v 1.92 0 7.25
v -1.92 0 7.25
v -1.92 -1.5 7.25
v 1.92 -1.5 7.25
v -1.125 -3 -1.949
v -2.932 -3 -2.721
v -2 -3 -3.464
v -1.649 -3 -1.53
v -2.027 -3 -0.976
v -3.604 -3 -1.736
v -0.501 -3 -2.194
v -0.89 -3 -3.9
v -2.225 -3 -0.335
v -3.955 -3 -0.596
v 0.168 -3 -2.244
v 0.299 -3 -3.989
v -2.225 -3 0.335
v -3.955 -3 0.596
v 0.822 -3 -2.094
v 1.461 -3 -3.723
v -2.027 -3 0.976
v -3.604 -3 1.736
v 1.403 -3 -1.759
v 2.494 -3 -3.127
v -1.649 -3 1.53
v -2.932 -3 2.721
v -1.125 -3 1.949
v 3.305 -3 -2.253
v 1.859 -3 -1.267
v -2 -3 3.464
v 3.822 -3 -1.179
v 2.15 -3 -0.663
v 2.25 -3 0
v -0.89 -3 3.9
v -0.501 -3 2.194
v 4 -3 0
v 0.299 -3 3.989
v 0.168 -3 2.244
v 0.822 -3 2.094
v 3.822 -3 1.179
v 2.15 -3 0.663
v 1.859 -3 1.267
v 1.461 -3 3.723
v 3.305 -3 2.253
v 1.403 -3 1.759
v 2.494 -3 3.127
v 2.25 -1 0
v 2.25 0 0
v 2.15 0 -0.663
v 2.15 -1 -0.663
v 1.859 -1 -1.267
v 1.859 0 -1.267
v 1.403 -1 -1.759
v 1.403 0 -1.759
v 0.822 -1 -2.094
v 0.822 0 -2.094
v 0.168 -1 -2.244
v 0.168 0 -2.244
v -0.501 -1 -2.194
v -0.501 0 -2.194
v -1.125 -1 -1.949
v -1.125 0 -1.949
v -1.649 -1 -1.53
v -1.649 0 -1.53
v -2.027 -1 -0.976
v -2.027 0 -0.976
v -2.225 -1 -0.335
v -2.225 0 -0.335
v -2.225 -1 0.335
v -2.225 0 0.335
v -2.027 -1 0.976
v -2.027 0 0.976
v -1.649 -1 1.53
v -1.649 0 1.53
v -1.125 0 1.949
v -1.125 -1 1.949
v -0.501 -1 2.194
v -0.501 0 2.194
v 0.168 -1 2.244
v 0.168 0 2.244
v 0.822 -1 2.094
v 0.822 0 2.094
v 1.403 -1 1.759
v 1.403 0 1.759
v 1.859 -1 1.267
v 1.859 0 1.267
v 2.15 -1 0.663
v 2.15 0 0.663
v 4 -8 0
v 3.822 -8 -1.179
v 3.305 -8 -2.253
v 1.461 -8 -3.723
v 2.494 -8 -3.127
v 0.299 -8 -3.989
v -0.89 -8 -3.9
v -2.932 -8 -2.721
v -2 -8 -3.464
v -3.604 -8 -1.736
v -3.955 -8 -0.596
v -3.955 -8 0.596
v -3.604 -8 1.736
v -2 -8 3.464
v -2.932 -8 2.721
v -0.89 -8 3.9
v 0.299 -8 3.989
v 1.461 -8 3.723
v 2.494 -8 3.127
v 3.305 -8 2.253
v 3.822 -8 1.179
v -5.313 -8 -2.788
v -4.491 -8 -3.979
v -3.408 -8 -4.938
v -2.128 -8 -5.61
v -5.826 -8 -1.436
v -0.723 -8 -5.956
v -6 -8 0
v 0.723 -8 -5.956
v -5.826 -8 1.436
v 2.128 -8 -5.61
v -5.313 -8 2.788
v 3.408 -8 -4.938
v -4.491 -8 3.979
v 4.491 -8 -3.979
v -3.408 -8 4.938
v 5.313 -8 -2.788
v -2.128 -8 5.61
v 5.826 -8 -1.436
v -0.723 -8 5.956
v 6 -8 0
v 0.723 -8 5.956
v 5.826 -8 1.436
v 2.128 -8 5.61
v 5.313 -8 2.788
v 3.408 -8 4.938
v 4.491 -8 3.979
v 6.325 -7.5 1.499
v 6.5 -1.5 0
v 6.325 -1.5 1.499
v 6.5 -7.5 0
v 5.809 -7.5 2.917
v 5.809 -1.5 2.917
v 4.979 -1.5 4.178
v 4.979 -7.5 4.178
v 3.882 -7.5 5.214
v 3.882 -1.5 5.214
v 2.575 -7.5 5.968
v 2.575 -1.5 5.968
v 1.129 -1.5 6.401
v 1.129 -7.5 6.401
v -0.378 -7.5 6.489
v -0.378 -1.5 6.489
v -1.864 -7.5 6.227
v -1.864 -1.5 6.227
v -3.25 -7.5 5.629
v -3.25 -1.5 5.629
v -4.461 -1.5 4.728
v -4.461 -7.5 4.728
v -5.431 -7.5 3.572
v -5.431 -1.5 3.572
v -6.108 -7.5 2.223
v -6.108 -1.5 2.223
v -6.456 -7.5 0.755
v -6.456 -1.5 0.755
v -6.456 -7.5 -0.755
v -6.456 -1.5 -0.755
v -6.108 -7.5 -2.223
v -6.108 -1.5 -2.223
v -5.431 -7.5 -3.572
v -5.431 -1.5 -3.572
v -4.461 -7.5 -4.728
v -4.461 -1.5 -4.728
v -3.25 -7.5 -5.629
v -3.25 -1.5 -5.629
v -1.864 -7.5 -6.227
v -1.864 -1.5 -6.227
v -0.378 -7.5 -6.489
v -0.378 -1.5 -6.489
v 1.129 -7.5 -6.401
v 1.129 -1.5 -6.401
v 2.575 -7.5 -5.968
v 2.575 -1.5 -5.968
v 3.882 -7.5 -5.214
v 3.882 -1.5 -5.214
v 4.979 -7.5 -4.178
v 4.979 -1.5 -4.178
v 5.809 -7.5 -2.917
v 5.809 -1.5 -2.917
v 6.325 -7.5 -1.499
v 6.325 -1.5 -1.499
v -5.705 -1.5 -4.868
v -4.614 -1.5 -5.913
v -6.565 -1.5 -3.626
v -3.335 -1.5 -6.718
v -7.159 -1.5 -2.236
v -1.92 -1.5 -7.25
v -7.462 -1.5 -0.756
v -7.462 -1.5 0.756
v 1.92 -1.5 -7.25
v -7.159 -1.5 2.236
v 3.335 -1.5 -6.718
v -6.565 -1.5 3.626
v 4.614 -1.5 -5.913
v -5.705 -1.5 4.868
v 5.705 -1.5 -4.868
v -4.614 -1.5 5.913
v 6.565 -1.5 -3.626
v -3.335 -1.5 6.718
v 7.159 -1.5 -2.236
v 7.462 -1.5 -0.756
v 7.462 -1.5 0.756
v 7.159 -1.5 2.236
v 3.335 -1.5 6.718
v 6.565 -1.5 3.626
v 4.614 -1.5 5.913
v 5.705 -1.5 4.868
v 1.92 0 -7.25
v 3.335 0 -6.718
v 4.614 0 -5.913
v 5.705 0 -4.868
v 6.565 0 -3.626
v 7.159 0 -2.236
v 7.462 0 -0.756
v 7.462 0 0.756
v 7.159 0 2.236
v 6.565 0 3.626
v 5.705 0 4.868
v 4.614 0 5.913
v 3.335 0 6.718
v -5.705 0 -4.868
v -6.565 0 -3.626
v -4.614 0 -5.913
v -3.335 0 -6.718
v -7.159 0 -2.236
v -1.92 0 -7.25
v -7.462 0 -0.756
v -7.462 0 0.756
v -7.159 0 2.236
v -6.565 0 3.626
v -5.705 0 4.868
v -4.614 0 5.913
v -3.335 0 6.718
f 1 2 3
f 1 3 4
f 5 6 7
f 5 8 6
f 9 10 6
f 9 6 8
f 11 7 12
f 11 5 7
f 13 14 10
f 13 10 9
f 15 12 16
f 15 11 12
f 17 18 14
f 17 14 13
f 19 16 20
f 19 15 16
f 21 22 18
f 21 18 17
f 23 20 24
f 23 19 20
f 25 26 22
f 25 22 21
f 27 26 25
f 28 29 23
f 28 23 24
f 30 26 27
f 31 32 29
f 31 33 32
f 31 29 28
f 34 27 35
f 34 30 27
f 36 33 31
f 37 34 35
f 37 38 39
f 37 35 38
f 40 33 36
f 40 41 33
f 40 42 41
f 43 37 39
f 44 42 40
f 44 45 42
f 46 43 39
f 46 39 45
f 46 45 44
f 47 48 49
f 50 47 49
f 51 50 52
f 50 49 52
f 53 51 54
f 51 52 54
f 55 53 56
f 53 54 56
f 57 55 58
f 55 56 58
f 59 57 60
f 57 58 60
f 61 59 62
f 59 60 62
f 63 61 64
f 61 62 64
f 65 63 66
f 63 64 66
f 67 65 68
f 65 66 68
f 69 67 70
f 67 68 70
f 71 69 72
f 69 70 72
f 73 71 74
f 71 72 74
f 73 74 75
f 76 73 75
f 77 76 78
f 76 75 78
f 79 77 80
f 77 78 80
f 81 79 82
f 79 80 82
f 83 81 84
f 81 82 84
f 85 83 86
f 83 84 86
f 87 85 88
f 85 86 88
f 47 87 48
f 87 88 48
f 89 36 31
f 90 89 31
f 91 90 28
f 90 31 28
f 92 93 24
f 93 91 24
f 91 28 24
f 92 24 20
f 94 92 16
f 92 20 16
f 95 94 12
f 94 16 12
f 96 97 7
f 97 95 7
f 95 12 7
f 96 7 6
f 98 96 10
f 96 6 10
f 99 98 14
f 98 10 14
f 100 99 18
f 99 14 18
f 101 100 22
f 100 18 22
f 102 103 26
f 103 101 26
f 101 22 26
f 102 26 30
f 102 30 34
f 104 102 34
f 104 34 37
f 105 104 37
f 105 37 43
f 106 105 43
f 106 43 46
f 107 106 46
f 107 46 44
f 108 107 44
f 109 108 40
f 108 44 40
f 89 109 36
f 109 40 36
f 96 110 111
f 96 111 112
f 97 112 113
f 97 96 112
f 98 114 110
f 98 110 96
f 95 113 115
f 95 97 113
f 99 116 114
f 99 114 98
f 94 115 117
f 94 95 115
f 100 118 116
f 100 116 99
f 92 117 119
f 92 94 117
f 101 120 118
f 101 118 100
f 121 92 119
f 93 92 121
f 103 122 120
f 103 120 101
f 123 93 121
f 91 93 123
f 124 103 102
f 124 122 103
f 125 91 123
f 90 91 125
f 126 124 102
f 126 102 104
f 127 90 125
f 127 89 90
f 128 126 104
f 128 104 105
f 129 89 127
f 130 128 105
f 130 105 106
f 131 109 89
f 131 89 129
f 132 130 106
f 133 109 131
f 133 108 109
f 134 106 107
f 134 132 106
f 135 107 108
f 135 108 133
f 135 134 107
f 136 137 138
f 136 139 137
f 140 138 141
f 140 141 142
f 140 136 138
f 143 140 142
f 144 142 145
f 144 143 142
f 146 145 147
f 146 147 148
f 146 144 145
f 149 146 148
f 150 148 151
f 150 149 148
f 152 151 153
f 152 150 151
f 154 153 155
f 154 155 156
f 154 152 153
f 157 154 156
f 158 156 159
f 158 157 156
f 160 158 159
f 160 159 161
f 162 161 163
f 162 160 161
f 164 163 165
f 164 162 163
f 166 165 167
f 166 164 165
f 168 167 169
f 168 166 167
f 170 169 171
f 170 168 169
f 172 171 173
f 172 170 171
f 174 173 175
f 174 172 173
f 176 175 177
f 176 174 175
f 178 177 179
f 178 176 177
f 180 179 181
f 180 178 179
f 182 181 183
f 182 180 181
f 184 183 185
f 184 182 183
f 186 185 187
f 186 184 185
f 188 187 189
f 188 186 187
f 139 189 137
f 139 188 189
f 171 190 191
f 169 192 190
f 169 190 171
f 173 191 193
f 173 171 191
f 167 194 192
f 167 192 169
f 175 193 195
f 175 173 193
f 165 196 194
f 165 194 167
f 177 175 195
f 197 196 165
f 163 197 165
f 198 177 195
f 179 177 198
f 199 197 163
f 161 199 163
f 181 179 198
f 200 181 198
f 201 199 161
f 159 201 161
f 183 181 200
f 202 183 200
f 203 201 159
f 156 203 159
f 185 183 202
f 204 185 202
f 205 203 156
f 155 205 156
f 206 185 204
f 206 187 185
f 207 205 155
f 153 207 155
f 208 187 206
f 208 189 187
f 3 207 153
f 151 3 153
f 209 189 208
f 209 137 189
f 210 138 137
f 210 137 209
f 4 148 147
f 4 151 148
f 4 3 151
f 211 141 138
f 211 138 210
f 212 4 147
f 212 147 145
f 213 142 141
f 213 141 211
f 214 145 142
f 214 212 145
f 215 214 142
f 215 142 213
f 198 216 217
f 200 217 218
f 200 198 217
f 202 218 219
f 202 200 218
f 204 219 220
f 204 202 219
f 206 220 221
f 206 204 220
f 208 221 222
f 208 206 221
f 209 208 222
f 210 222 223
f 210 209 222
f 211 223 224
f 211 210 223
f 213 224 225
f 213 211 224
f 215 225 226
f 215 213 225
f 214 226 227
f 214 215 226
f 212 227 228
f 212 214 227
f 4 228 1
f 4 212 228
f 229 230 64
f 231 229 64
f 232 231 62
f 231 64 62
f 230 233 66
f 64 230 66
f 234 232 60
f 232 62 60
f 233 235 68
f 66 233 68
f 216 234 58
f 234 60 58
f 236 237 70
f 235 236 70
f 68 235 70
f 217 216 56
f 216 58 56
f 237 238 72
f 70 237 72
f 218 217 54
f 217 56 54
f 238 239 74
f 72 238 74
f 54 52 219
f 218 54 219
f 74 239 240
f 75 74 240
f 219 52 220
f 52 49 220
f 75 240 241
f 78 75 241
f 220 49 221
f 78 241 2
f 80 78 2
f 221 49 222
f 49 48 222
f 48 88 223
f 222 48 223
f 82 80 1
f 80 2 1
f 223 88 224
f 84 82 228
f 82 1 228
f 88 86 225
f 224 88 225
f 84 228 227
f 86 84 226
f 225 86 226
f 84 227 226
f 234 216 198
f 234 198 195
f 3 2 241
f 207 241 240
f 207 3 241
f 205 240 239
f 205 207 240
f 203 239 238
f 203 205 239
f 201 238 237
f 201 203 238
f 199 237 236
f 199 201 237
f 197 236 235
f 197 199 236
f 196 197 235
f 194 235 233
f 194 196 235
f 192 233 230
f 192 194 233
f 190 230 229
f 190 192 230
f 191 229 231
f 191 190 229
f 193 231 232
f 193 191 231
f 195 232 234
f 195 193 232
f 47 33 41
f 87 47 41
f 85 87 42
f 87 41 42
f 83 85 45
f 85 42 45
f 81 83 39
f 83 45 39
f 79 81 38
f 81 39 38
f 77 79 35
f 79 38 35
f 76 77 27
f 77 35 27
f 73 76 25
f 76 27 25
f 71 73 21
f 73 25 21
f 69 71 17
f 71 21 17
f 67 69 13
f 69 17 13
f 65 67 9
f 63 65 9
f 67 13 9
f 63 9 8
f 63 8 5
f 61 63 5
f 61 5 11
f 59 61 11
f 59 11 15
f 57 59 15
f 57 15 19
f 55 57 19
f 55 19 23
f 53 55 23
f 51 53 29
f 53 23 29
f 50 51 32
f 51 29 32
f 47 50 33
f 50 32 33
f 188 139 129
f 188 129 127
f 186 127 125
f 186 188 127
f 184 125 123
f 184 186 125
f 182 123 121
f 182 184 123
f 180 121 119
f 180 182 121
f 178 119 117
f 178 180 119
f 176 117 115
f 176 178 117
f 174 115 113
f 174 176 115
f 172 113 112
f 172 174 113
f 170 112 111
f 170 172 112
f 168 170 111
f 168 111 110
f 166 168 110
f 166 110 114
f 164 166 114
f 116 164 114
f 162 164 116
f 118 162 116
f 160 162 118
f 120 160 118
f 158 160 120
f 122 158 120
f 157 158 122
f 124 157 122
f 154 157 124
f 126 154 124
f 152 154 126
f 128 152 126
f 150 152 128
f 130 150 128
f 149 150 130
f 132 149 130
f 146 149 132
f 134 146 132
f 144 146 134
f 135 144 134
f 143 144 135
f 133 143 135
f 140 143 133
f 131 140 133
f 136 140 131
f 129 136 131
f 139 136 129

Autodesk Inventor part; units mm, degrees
ref_plane "YZ Plane" through (0, 0, 0) normal (1, 0, 0) x (0, 1, 0)
ref_plane "XZ Plane" through (0, 0, 0) normal (0, 1, 0) x (-1, 0, 0)
ref_plane "XY Plane" through (0, 0, 0) normal (0, 0, 1) x (1, 0, 0)
sketch "Sketch1" plane through (0, 0, 0) normal (0, 0, 1) x (1, 0, 0)
  line L0 (0, 0) -> (0, -9.8072)
  line L1 (2.25, 0) -> (7.5, 0)
  line L2 (7.5, 0) -> (7.5, -1.5)
  line L3 (7.5, -1.5) -> (6.5, -1.5)
  line L4 (6.5, -1.5) -> (6.5, -8)
  line L5 (6.5, -8) -> (4, -8)
  line L6 (4, -8) -> (4, -3)
  line L7 (2.25, -1) -> (2.25, -1)
  line L8 (2.25, -1) -> (2.25, 0)
  line L9 (2.25, -1) -> (2.25, -3)
  line L10 (2.25, -3) -> (4, -3)
  dimension "d1" = 4.5
  dimension "d2" = 8
  dimension "d3" = 13
  dimension "d4" = 1.5
  dimension "d6" = 15
  dimension "d19" = 2
  dimension "d20" = 4.5
  dimension "d21" = 8
  dimension "d22" = 2.5
  dimension "d25" = 5
  dimension "d26" = 1
revolve "Revolution1" add sketch "Sketch1" angle 360 about axis through (0, 0, 0) along (0, -1, 0)
sketch "Sketch2" plane through (0, 0, 0) normal (0, 1, 0) x (1, 0, 0)
  circle A0 centre (0, 0) radius 7.5 projected
  line L0 (-1.9203, -7.25) -> (1.9203, -7.25)
  line L1 (1.9203, -7.25) -> (1.9203, 7.25)
  line L2 (1.9203, 7.25) -> (-1.9203, 7.25)
  line L3 (-1.9203, 7.25) -> (-1.9203, -7.25)
  point P0 (0, -7.25)
  point P1 (1.9203, -7.25)
  point P2 (-1.9203, 7.25)
  point P3 (1.9203, -7.25)
  point P4 (-1.9203, 7.25)
  dimension "d29" = 14.5
extrude "Extrusion1" cut sketch "Sketch2" against normal blind 10 contours L2 A0 | A0 L0
chamfer "Chamfer1" distance 0.5 angle 45 1 edges at (-6.5, -8, 0)
thread "Thread3" size "M14x0.75" class "6g" standard "ANSI Metric M Profile" full length
equation "\"d1\" = d20"
properties part number "endcap"
